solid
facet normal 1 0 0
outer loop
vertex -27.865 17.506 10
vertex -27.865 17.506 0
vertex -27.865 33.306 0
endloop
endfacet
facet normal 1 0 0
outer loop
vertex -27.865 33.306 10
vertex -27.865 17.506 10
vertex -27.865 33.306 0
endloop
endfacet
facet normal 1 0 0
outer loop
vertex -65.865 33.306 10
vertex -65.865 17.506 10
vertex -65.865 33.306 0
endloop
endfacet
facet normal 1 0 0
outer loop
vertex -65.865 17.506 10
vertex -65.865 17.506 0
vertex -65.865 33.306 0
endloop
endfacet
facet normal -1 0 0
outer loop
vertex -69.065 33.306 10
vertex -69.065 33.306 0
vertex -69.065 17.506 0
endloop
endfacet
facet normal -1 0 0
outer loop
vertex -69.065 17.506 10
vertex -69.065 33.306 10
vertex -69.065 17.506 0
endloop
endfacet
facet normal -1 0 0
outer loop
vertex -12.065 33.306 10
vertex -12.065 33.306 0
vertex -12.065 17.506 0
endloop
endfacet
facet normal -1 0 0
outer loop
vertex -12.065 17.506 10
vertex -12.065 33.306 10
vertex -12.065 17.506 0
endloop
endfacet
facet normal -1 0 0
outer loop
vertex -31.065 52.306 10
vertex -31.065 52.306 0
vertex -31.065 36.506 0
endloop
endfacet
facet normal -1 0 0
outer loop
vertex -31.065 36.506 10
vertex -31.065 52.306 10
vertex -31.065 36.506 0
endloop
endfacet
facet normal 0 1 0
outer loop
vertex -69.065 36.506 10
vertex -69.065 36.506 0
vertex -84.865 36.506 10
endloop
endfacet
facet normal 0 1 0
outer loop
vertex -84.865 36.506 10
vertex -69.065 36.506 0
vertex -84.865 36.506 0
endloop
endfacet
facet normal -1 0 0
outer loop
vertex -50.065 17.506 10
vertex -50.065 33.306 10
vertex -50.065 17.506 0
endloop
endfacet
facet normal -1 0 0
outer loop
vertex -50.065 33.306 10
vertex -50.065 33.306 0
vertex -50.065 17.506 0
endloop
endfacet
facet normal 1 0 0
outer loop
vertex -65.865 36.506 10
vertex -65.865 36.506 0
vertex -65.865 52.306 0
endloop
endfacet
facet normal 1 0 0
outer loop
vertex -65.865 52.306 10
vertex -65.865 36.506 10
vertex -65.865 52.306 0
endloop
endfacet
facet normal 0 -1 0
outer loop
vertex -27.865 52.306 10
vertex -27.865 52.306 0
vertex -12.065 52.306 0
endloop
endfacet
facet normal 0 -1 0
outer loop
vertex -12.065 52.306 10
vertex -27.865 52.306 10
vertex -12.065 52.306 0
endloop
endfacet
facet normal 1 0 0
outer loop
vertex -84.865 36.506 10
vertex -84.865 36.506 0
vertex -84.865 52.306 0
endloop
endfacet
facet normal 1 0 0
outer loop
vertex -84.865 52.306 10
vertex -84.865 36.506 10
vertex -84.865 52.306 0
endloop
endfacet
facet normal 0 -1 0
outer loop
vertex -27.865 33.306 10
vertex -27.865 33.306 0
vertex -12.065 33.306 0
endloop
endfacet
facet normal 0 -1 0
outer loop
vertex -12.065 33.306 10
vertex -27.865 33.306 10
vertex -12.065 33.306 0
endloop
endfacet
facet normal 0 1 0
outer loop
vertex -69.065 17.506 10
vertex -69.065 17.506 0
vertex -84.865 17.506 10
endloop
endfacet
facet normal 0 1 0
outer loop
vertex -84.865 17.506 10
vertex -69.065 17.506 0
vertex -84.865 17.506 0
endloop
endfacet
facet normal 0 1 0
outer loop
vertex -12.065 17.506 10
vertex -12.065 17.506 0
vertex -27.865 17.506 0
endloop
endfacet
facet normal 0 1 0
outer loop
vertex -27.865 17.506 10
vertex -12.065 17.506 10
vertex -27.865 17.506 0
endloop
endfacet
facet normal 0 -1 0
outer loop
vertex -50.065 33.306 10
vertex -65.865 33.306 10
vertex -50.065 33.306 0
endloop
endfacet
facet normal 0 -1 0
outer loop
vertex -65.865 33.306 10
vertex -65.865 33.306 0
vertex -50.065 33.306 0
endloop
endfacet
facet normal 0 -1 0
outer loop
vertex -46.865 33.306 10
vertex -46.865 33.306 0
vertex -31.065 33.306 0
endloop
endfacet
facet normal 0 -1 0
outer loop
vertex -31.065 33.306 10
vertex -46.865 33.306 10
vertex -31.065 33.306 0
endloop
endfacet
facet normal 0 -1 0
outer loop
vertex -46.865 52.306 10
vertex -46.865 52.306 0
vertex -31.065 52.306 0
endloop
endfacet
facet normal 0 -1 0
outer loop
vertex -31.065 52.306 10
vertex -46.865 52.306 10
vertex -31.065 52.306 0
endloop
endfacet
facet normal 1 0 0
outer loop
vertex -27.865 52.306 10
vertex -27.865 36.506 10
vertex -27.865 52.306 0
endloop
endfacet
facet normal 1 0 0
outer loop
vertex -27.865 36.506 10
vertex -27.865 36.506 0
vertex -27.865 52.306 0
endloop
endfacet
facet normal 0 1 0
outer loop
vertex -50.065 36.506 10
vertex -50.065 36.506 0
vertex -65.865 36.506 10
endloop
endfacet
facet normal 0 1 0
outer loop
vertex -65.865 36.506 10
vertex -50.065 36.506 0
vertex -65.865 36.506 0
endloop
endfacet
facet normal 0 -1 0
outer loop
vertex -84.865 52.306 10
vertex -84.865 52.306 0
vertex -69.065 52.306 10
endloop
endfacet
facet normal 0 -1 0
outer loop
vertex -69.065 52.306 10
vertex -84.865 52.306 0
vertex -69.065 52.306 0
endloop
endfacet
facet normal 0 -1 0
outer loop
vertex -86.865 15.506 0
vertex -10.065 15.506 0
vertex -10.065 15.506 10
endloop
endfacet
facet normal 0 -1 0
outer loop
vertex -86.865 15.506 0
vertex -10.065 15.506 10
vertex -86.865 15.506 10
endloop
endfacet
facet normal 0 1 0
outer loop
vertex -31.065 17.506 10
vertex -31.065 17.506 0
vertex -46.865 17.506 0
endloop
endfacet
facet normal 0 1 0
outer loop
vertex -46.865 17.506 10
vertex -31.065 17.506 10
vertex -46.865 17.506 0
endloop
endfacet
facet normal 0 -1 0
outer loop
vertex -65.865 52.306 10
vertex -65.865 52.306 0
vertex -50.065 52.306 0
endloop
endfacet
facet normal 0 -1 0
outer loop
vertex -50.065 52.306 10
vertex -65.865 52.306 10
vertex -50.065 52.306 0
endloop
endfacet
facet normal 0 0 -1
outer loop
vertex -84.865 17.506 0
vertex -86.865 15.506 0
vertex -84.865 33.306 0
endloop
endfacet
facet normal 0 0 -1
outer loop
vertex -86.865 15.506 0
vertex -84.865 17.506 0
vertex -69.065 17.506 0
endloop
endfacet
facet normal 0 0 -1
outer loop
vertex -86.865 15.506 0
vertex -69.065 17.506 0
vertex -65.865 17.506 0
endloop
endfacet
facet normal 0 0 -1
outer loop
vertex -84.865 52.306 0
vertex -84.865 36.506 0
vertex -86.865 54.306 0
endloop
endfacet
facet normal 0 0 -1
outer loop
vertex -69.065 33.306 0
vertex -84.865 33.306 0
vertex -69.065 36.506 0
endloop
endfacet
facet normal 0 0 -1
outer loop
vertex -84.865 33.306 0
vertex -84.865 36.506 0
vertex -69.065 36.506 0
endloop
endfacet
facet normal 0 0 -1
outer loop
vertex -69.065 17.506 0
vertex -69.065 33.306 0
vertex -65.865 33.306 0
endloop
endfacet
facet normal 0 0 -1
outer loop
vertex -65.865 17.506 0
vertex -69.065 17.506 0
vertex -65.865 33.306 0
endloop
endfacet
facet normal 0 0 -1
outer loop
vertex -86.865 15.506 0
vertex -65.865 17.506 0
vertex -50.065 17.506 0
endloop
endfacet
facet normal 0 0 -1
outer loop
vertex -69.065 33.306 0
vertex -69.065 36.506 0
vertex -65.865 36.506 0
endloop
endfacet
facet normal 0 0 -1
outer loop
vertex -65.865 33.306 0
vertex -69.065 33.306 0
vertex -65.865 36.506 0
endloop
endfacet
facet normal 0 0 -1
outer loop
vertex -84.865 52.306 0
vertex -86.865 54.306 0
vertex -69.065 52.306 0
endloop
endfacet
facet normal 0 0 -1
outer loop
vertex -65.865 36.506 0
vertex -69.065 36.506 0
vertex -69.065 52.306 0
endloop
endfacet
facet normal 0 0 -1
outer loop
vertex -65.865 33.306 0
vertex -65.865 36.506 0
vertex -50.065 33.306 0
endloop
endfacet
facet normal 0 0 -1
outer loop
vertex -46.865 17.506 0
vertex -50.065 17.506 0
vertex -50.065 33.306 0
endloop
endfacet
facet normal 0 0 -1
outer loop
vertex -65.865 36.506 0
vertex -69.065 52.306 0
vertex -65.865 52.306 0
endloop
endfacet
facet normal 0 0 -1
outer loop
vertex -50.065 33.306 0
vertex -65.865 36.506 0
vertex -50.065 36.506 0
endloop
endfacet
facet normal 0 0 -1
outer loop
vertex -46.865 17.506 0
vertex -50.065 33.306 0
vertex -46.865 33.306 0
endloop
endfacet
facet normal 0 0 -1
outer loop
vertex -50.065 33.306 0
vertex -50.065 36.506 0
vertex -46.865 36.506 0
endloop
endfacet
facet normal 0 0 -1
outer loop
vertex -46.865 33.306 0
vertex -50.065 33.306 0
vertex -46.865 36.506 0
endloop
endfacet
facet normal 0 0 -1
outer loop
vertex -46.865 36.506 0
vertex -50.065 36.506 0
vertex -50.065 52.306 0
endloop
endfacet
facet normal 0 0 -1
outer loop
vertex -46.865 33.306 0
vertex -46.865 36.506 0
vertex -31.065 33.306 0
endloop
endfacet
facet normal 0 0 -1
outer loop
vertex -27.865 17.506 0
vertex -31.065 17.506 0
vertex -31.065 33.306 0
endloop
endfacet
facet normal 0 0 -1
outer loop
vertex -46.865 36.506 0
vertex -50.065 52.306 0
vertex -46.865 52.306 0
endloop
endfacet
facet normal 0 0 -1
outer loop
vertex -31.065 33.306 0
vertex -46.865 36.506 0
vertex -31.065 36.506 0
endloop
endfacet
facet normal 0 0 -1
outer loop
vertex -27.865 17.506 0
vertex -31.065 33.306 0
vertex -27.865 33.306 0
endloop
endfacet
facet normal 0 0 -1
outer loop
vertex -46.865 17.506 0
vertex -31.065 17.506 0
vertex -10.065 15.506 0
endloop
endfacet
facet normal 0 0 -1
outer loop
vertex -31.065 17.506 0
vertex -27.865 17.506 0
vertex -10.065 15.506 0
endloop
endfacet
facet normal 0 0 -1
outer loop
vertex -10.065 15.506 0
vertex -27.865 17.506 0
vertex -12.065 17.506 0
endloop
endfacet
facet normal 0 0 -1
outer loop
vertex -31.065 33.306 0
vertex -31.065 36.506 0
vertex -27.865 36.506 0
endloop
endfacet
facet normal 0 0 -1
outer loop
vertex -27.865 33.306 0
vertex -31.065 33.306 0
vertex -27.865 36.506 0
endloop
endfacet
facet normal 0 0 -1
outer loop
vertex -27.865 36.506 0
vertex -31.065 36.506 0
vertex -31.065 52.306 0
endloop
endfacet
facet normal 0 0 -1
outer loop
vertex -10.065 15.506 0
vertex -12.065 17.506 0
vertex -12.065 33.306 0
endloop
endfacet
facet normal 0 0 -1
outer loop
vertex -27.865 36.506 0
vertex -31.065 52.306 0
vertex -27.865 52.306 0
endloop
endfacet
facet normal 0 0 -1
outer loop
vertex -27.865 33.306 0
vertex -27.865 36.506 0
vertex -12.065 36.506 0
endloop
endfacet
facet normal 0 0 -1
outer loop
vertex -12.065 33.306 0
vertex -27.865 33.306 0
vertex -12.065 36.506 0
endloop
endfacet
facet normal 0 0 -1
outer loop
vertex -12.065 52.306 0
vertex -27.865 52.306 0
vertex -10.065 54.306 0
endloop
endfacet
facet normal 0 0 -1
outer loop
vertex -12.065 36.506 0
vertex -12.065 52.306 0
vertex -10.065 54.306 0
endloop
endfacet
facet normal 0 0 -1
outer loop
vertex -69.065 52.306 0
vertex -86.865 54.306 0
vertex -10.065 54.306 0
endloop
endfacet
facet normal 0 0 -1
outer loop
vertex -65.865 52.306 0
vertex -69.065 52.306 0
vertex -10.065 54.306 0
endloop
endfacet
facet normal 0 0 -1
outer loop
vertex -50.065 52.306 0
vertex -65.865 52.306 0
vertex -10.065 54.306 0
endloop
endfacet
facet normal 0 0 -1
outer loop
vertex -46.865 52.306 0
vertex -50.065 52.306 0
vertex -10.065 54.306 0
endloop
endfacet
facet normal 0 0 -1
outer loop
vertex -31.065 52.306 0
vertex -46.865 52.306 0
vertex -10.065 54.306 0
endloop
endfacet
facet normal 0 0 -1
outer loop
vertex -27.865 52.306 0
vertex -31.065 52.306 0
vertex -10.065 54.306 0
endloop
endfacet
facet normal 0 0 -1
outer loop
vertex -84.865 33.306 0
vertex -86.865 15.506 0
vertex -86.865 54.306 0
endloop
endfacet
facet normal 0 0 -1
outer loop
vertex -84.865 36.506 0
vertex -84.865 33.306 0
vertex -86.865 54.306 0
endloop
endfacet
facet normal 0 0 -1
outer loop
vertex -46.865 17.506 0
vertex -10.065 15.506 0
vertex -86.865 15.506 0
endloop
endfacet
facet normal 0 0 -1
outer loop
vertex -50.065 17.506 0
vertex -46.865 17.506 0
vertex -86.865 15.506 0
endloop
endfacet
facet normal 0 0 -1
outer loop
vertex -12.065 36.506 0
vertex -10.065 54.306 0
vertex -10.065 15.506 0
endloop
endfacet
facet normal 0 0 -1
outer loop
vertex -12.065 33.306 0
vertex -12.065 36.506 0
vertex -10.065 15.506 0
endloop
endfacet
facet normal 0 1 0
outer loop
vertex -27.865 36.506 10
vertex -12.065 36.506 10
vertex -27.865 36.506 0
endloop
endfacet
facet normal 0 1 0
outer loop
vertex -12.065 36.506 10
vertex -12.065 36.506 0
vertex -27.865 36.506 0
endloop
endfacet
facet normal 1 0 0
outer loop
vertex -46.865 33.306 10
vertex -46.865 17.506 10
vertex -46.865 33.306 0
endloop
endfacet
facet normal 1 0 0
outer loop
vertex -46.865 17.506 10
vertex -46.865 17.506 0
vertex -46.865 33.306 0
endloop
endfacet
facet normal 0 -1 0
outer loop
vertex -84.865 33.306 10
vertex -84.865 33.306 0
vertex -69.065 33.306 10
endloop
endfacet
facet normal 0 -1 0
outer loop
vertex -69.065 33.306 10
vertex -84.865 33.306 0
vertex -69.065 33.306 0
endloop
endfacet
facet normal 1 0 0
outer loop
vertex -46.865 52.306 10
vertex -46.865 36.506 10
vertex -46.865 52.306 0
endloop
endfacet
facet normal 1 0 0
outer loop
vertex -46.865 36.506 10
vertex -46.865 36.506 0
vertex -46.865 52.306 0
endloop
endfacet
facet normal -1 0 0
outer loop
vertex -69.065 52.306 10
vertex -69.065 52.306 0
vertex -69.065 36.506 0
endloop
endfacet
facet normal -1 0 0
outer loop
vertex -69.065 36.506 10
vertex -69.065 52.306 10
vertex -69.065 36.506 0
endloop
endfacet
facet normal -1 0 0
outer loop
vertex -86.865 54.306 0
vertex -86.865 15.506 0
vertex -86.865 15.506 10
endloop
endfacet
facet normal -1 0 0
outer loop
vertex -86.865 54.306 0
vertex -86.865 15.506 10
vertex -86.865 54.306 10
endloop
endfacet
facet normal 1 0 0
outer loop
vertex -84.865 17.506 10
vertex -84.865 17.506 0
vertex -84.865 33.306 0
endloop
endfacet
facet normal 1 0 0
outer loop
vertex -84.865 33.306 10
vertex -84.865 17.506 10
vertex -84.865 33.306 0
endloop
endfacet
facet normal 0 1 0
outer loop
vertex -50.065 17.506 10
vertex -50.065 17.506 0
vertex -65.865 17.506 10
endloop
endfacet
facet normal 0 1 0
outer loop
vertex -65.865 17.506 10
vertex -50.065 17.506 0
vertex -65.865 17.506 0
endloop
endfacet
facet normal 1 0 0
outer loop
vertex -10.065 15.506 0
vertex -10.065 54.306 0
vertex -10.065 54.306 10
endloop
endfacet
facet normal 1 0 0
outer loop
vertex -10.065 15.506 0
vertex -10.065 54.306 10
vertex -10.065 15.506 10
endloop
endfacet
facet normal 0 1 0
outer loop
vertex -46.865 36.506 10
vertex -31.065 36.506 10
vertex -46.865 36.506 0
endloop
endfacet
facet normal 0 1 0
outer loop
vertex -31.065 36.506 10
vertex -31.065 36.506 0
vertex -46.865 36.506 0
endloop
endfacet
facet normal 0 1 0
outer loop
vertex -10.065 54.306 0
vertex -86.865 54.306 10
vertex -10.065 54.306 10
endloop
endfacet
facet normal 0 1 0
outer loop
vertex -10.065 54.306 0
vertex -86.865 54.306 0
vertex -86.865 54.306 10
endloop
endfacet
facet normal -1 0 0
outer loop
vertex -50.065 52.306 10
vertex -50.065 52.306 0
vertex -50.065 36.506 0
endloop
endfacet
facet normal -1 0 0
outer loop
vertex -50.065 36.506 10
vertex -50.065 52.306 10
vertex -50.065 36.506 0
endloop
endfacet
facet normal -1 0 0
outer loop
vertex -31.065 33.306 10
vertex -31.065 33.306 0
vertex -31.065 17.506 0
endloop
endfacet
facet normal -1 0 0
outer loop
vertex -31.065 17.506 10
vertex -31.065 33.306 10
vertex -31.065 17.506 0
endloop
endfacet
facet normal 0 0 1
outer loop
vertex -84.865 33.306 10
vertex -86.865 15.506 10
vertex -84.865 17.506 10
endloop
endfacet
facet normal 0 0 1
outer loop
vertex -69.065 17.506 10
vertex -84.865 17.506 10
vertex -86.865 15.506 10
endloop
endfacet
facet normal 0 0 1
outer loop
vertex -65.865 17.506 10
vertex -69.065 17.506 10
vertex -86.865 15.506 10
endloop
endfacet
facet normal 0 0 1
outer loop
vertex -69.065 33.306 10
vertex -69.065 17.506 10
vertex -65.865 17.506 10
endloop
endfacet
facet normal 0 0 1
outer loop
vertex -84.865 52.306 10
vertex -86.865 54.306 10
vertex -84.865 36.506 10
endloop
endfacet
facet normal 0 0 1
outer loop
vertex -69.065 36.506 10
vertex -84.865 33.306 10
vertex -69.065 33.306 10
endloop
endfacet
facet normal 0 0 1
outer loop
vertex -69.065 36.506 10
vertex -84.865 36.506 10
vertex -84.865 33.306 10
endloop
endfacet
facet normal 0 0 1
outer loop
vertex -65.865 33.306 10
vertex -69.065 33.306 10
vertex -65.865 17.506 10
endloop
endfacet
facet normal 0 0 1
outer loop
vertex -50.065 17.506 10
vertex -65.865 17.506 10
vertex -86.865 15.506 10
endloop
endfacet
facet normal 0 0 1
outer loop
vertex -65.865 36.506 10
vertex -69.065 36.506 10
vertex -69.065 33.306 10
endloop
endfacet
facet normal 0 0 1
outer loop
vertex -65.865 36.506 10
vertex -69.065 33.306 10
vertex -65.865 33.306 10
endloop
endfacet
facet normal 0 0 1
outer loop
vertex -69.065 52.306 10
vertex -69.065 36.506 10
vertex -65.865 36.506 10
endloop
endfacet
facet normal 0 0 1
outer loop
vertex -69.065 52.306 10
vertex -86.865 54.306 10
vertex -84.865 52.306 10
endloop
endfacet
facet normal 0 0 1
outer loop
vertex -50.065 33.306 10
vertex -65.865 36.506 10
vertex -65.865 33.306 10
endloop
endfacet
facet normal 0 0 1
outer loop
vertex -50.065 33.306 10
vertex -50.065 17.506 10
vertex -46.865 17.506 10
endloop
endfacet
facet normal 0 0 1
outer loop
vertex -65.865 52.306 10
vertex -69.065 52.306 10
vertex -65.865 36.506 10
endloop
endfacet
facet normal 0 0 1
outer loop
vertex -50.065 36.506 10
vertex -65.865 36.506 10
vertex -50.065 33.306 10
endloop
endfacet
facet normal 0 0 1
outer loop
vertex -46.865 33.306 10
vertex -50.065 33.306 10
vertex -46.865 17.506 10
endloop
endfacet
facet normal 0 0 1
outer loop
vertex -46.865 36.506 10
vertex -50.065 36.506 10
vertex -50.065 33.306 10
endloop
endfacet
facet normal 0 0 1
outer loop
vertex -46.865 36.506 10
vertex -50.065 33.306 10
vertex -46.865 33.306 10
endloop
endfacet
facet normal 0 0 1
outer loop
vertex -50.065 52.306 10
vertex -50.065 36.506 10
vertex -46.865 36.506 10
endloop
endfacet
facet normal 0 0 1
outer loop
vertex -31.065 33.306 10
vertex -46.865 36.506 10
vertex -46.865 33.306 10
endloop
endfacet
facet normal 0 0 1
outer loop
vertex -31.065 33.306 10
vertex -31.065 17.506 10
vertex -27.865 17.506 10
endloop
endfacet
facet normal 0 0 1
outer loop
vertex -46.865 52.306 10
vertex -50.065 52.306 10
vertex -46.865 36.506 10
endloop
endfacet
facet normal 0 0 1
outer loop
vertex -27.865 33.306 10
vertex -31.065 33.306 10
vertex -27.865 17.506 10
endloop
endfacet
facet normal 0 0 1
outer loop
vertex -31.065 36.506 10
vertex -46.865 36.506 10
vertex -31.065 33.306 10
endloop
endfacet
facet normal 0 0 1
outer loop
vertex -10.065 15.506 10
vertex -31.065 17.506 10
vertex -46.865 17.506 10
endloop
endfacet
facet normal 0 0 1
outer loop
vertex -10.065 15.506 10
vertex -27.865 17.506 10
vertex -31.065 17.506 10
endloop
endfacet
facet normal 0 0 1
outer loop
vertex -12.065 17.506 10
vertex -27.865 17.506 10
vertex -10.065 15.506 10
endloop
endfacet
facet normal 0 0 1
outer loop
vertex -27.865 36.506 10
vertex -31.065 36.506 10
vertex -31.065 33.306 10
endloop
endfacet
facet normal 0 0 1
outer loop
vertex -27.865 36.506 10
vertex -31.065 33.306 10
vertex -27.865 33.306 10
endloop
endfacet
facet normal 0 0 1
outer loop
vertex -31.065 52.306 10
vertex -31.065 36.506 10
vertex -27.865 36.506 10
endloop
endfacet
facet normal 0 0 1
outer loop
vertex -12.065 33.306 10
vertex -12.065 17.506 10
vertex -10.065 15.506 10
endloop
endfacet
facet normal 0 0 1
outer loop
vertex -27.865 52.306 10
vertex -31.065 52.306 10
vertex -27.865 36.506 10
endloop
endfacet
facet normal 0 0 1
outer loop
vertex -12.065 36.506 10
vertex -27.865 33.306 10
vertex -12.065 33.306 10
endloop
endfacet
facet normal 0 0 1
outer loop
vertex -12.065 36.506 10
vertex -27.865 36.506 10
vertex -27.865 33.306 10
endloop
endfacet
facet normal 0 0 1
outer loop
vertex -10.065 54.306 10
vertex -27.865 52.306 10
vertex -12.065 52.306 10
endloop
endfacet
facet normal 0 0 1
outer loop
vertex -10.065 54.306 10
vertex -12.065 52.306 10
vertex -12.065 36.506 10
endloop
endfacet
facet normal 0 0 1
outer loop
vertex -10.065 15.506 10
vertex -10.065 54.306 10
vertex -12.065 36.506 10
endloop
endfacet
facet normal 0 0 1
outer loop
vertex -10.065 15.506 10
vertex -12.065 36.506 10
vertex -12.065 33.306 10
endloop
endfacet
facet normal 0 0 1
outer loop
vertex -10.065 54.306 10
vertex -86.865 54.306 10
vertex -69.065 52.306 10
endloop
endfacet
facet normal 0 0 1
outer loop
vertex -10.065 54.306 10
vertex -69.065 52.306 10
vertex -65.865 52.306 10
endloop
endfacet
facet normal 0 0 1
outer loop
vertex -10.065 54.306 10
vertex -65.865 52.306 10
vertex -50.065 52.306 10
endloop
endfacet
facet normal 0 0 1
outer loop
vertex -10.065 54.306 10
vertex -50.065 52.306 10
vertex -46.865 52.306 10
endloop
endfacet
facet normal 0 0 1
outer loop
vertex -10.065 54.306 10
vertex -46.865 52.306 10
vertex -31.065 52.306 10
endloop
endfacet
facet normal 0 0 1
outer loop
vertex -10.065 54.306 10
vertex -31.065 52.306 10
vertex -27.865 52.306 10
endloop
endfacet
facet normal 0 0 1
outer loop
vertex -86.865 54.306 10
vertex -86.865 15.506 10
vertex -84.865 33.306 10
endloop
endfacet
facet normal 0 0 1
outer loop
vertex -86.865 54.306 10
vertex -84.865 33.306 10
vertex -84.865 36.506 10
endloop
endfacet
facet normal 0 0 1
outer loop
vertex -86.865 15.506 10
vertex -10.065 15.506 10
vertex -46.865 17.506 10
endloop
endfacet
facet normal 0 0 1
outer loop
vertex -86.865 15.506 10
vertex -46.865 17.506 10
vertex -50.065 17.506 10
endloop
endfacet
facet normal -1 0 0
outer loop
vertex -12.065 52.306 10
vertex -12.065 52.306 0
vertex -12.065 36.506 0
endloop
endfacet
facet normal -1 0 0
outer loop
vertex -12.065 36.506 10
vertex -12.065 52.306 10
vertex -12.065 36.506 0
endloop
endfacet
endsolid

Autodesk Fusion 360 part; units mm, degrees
sketch "Sketch1" plane through (0, 0, 0) normal (0, 0, 1) x (1, 0, 0)
  line L0 (-84.8651, 33.3057) -> (-69.0651, 33.3057)
  line L1 (-69.0651, 33.3057) -> (-69.0651, 17.5057)
  line L2 (-69.0651, 17.5057) -> (-84.8651, 17.5057)
  line L3 (-84.8651, 17.5057) -> (-84.8651, 33.3057)
  line L4 (-84.8651, 33.3057) -> (-69.0651, 17.5057) construction
  line L5 (-69.0651, 33.3057) -> (-84.8651, 17.5057) construction
  line L6 (-50.0651, 33.3057) -> (-50.0651, 17.5057)
  line L7 (-65.8651, 33.3057) -> (-50.0651, 33.3057)
  line L8 (-65.8651, 17.5057) -> (-65.8651, 33.3057)
  line L9 (-50.0651, 17.5057) -> (-65.8651, 17.5057)
  line L10 (-31.0651, 33.3057) -> (-31.0651, 17.5057)
  line L11 (-46.8651, 33.3057) -> (-31.0651, 33.3057)
  line L12 (-46.8651, 17.5057) -> (-46.8651, 33.3057)
  line L13 (-31.0651, 17.5057) -> (-46.8651, 17.5057)
  line L14 (-12.0651, 33.3057) -> (-12.0651, 17.5057)
  line L15 (-27.8651, 33.3057) -> (-12.0651, 33.3057)
  line L16 (-27.8651, 17.5057) -> (-27.8651, 33.3057)
  line L17 (-12.0651, 17.5057) -> (-27.8651, 17.5057)
  line L18 (-69.0651, 52.3057) -> (-69.0651, 36.5057)
  line L19 (-84.8651, 52.3057) -> (-69.0651, 52.3057)
  line L20 (-84.8651, 36.5057) -> (-84.8651, 52.3057)
  line L21 (-69.0651, 36.5057) -> (-84.8651, 36.5057)
  line L22 (-50.0651, 52.3057) -> (-50.0651, 36.5057)
  line L23 (-65.8651, 52.3057) -> (-50.0651, 52.3057)
  line L24 (-65.8651, 36.5057) -> (-65.8651, 52.3057)
  line L25 (-50.0651, 36.5057) -> (-65.8651, 36.5057)
  line L26 (-31.0651, 52.3057) -> (-31.0651, 36.5057)
  line L27 (-46.8651, 52.3057) -> (-31.0651, 52.3057)
  line L28 (-46.8651, 36.5057) -> (-46.8651, 52.3057)
  line L29 (-31.0651, 36.5057) -> (-46.8651, 36.5057)
  line L30 (-12.0651, 52.3057) -> (-12.0651, 36.5057)
  line L31 (-27.8651, 52.3057) -> (-12.0651, 52.3057)
  line L32 (-27.8651, 36.5057) -> (-27.8651, 52.3057)
  line L33 (-12.0651, 36.5057) -> (-27.8651, 36.5057)
  line L34 (-86.8651, 54.3057) -> (-10.0651, 54.3057)
  line L35 (-10.0651, 54.3057) -> (-10.0651, 15.5057)
  line L36 (-10.0651, 15.5057) -> (-86.8651, 15.5057)
  line L37 (-86.8651, 15.5057) -> (-86.8651, 54.3057)
  point P0 (-76.9651, 25.4057)
  dimension "d3" = 15.8
  dimension "d4" = 15.8
  dimension "d7" = 19
  dimension "d8" = 19
  dimension "d9" = 2
  dimension "d10" = 2
  dimension "d11" = 2
  dimension "d12" = 2
extrude "Extrude1" add sketch "Sketch1" along normal blind 10
